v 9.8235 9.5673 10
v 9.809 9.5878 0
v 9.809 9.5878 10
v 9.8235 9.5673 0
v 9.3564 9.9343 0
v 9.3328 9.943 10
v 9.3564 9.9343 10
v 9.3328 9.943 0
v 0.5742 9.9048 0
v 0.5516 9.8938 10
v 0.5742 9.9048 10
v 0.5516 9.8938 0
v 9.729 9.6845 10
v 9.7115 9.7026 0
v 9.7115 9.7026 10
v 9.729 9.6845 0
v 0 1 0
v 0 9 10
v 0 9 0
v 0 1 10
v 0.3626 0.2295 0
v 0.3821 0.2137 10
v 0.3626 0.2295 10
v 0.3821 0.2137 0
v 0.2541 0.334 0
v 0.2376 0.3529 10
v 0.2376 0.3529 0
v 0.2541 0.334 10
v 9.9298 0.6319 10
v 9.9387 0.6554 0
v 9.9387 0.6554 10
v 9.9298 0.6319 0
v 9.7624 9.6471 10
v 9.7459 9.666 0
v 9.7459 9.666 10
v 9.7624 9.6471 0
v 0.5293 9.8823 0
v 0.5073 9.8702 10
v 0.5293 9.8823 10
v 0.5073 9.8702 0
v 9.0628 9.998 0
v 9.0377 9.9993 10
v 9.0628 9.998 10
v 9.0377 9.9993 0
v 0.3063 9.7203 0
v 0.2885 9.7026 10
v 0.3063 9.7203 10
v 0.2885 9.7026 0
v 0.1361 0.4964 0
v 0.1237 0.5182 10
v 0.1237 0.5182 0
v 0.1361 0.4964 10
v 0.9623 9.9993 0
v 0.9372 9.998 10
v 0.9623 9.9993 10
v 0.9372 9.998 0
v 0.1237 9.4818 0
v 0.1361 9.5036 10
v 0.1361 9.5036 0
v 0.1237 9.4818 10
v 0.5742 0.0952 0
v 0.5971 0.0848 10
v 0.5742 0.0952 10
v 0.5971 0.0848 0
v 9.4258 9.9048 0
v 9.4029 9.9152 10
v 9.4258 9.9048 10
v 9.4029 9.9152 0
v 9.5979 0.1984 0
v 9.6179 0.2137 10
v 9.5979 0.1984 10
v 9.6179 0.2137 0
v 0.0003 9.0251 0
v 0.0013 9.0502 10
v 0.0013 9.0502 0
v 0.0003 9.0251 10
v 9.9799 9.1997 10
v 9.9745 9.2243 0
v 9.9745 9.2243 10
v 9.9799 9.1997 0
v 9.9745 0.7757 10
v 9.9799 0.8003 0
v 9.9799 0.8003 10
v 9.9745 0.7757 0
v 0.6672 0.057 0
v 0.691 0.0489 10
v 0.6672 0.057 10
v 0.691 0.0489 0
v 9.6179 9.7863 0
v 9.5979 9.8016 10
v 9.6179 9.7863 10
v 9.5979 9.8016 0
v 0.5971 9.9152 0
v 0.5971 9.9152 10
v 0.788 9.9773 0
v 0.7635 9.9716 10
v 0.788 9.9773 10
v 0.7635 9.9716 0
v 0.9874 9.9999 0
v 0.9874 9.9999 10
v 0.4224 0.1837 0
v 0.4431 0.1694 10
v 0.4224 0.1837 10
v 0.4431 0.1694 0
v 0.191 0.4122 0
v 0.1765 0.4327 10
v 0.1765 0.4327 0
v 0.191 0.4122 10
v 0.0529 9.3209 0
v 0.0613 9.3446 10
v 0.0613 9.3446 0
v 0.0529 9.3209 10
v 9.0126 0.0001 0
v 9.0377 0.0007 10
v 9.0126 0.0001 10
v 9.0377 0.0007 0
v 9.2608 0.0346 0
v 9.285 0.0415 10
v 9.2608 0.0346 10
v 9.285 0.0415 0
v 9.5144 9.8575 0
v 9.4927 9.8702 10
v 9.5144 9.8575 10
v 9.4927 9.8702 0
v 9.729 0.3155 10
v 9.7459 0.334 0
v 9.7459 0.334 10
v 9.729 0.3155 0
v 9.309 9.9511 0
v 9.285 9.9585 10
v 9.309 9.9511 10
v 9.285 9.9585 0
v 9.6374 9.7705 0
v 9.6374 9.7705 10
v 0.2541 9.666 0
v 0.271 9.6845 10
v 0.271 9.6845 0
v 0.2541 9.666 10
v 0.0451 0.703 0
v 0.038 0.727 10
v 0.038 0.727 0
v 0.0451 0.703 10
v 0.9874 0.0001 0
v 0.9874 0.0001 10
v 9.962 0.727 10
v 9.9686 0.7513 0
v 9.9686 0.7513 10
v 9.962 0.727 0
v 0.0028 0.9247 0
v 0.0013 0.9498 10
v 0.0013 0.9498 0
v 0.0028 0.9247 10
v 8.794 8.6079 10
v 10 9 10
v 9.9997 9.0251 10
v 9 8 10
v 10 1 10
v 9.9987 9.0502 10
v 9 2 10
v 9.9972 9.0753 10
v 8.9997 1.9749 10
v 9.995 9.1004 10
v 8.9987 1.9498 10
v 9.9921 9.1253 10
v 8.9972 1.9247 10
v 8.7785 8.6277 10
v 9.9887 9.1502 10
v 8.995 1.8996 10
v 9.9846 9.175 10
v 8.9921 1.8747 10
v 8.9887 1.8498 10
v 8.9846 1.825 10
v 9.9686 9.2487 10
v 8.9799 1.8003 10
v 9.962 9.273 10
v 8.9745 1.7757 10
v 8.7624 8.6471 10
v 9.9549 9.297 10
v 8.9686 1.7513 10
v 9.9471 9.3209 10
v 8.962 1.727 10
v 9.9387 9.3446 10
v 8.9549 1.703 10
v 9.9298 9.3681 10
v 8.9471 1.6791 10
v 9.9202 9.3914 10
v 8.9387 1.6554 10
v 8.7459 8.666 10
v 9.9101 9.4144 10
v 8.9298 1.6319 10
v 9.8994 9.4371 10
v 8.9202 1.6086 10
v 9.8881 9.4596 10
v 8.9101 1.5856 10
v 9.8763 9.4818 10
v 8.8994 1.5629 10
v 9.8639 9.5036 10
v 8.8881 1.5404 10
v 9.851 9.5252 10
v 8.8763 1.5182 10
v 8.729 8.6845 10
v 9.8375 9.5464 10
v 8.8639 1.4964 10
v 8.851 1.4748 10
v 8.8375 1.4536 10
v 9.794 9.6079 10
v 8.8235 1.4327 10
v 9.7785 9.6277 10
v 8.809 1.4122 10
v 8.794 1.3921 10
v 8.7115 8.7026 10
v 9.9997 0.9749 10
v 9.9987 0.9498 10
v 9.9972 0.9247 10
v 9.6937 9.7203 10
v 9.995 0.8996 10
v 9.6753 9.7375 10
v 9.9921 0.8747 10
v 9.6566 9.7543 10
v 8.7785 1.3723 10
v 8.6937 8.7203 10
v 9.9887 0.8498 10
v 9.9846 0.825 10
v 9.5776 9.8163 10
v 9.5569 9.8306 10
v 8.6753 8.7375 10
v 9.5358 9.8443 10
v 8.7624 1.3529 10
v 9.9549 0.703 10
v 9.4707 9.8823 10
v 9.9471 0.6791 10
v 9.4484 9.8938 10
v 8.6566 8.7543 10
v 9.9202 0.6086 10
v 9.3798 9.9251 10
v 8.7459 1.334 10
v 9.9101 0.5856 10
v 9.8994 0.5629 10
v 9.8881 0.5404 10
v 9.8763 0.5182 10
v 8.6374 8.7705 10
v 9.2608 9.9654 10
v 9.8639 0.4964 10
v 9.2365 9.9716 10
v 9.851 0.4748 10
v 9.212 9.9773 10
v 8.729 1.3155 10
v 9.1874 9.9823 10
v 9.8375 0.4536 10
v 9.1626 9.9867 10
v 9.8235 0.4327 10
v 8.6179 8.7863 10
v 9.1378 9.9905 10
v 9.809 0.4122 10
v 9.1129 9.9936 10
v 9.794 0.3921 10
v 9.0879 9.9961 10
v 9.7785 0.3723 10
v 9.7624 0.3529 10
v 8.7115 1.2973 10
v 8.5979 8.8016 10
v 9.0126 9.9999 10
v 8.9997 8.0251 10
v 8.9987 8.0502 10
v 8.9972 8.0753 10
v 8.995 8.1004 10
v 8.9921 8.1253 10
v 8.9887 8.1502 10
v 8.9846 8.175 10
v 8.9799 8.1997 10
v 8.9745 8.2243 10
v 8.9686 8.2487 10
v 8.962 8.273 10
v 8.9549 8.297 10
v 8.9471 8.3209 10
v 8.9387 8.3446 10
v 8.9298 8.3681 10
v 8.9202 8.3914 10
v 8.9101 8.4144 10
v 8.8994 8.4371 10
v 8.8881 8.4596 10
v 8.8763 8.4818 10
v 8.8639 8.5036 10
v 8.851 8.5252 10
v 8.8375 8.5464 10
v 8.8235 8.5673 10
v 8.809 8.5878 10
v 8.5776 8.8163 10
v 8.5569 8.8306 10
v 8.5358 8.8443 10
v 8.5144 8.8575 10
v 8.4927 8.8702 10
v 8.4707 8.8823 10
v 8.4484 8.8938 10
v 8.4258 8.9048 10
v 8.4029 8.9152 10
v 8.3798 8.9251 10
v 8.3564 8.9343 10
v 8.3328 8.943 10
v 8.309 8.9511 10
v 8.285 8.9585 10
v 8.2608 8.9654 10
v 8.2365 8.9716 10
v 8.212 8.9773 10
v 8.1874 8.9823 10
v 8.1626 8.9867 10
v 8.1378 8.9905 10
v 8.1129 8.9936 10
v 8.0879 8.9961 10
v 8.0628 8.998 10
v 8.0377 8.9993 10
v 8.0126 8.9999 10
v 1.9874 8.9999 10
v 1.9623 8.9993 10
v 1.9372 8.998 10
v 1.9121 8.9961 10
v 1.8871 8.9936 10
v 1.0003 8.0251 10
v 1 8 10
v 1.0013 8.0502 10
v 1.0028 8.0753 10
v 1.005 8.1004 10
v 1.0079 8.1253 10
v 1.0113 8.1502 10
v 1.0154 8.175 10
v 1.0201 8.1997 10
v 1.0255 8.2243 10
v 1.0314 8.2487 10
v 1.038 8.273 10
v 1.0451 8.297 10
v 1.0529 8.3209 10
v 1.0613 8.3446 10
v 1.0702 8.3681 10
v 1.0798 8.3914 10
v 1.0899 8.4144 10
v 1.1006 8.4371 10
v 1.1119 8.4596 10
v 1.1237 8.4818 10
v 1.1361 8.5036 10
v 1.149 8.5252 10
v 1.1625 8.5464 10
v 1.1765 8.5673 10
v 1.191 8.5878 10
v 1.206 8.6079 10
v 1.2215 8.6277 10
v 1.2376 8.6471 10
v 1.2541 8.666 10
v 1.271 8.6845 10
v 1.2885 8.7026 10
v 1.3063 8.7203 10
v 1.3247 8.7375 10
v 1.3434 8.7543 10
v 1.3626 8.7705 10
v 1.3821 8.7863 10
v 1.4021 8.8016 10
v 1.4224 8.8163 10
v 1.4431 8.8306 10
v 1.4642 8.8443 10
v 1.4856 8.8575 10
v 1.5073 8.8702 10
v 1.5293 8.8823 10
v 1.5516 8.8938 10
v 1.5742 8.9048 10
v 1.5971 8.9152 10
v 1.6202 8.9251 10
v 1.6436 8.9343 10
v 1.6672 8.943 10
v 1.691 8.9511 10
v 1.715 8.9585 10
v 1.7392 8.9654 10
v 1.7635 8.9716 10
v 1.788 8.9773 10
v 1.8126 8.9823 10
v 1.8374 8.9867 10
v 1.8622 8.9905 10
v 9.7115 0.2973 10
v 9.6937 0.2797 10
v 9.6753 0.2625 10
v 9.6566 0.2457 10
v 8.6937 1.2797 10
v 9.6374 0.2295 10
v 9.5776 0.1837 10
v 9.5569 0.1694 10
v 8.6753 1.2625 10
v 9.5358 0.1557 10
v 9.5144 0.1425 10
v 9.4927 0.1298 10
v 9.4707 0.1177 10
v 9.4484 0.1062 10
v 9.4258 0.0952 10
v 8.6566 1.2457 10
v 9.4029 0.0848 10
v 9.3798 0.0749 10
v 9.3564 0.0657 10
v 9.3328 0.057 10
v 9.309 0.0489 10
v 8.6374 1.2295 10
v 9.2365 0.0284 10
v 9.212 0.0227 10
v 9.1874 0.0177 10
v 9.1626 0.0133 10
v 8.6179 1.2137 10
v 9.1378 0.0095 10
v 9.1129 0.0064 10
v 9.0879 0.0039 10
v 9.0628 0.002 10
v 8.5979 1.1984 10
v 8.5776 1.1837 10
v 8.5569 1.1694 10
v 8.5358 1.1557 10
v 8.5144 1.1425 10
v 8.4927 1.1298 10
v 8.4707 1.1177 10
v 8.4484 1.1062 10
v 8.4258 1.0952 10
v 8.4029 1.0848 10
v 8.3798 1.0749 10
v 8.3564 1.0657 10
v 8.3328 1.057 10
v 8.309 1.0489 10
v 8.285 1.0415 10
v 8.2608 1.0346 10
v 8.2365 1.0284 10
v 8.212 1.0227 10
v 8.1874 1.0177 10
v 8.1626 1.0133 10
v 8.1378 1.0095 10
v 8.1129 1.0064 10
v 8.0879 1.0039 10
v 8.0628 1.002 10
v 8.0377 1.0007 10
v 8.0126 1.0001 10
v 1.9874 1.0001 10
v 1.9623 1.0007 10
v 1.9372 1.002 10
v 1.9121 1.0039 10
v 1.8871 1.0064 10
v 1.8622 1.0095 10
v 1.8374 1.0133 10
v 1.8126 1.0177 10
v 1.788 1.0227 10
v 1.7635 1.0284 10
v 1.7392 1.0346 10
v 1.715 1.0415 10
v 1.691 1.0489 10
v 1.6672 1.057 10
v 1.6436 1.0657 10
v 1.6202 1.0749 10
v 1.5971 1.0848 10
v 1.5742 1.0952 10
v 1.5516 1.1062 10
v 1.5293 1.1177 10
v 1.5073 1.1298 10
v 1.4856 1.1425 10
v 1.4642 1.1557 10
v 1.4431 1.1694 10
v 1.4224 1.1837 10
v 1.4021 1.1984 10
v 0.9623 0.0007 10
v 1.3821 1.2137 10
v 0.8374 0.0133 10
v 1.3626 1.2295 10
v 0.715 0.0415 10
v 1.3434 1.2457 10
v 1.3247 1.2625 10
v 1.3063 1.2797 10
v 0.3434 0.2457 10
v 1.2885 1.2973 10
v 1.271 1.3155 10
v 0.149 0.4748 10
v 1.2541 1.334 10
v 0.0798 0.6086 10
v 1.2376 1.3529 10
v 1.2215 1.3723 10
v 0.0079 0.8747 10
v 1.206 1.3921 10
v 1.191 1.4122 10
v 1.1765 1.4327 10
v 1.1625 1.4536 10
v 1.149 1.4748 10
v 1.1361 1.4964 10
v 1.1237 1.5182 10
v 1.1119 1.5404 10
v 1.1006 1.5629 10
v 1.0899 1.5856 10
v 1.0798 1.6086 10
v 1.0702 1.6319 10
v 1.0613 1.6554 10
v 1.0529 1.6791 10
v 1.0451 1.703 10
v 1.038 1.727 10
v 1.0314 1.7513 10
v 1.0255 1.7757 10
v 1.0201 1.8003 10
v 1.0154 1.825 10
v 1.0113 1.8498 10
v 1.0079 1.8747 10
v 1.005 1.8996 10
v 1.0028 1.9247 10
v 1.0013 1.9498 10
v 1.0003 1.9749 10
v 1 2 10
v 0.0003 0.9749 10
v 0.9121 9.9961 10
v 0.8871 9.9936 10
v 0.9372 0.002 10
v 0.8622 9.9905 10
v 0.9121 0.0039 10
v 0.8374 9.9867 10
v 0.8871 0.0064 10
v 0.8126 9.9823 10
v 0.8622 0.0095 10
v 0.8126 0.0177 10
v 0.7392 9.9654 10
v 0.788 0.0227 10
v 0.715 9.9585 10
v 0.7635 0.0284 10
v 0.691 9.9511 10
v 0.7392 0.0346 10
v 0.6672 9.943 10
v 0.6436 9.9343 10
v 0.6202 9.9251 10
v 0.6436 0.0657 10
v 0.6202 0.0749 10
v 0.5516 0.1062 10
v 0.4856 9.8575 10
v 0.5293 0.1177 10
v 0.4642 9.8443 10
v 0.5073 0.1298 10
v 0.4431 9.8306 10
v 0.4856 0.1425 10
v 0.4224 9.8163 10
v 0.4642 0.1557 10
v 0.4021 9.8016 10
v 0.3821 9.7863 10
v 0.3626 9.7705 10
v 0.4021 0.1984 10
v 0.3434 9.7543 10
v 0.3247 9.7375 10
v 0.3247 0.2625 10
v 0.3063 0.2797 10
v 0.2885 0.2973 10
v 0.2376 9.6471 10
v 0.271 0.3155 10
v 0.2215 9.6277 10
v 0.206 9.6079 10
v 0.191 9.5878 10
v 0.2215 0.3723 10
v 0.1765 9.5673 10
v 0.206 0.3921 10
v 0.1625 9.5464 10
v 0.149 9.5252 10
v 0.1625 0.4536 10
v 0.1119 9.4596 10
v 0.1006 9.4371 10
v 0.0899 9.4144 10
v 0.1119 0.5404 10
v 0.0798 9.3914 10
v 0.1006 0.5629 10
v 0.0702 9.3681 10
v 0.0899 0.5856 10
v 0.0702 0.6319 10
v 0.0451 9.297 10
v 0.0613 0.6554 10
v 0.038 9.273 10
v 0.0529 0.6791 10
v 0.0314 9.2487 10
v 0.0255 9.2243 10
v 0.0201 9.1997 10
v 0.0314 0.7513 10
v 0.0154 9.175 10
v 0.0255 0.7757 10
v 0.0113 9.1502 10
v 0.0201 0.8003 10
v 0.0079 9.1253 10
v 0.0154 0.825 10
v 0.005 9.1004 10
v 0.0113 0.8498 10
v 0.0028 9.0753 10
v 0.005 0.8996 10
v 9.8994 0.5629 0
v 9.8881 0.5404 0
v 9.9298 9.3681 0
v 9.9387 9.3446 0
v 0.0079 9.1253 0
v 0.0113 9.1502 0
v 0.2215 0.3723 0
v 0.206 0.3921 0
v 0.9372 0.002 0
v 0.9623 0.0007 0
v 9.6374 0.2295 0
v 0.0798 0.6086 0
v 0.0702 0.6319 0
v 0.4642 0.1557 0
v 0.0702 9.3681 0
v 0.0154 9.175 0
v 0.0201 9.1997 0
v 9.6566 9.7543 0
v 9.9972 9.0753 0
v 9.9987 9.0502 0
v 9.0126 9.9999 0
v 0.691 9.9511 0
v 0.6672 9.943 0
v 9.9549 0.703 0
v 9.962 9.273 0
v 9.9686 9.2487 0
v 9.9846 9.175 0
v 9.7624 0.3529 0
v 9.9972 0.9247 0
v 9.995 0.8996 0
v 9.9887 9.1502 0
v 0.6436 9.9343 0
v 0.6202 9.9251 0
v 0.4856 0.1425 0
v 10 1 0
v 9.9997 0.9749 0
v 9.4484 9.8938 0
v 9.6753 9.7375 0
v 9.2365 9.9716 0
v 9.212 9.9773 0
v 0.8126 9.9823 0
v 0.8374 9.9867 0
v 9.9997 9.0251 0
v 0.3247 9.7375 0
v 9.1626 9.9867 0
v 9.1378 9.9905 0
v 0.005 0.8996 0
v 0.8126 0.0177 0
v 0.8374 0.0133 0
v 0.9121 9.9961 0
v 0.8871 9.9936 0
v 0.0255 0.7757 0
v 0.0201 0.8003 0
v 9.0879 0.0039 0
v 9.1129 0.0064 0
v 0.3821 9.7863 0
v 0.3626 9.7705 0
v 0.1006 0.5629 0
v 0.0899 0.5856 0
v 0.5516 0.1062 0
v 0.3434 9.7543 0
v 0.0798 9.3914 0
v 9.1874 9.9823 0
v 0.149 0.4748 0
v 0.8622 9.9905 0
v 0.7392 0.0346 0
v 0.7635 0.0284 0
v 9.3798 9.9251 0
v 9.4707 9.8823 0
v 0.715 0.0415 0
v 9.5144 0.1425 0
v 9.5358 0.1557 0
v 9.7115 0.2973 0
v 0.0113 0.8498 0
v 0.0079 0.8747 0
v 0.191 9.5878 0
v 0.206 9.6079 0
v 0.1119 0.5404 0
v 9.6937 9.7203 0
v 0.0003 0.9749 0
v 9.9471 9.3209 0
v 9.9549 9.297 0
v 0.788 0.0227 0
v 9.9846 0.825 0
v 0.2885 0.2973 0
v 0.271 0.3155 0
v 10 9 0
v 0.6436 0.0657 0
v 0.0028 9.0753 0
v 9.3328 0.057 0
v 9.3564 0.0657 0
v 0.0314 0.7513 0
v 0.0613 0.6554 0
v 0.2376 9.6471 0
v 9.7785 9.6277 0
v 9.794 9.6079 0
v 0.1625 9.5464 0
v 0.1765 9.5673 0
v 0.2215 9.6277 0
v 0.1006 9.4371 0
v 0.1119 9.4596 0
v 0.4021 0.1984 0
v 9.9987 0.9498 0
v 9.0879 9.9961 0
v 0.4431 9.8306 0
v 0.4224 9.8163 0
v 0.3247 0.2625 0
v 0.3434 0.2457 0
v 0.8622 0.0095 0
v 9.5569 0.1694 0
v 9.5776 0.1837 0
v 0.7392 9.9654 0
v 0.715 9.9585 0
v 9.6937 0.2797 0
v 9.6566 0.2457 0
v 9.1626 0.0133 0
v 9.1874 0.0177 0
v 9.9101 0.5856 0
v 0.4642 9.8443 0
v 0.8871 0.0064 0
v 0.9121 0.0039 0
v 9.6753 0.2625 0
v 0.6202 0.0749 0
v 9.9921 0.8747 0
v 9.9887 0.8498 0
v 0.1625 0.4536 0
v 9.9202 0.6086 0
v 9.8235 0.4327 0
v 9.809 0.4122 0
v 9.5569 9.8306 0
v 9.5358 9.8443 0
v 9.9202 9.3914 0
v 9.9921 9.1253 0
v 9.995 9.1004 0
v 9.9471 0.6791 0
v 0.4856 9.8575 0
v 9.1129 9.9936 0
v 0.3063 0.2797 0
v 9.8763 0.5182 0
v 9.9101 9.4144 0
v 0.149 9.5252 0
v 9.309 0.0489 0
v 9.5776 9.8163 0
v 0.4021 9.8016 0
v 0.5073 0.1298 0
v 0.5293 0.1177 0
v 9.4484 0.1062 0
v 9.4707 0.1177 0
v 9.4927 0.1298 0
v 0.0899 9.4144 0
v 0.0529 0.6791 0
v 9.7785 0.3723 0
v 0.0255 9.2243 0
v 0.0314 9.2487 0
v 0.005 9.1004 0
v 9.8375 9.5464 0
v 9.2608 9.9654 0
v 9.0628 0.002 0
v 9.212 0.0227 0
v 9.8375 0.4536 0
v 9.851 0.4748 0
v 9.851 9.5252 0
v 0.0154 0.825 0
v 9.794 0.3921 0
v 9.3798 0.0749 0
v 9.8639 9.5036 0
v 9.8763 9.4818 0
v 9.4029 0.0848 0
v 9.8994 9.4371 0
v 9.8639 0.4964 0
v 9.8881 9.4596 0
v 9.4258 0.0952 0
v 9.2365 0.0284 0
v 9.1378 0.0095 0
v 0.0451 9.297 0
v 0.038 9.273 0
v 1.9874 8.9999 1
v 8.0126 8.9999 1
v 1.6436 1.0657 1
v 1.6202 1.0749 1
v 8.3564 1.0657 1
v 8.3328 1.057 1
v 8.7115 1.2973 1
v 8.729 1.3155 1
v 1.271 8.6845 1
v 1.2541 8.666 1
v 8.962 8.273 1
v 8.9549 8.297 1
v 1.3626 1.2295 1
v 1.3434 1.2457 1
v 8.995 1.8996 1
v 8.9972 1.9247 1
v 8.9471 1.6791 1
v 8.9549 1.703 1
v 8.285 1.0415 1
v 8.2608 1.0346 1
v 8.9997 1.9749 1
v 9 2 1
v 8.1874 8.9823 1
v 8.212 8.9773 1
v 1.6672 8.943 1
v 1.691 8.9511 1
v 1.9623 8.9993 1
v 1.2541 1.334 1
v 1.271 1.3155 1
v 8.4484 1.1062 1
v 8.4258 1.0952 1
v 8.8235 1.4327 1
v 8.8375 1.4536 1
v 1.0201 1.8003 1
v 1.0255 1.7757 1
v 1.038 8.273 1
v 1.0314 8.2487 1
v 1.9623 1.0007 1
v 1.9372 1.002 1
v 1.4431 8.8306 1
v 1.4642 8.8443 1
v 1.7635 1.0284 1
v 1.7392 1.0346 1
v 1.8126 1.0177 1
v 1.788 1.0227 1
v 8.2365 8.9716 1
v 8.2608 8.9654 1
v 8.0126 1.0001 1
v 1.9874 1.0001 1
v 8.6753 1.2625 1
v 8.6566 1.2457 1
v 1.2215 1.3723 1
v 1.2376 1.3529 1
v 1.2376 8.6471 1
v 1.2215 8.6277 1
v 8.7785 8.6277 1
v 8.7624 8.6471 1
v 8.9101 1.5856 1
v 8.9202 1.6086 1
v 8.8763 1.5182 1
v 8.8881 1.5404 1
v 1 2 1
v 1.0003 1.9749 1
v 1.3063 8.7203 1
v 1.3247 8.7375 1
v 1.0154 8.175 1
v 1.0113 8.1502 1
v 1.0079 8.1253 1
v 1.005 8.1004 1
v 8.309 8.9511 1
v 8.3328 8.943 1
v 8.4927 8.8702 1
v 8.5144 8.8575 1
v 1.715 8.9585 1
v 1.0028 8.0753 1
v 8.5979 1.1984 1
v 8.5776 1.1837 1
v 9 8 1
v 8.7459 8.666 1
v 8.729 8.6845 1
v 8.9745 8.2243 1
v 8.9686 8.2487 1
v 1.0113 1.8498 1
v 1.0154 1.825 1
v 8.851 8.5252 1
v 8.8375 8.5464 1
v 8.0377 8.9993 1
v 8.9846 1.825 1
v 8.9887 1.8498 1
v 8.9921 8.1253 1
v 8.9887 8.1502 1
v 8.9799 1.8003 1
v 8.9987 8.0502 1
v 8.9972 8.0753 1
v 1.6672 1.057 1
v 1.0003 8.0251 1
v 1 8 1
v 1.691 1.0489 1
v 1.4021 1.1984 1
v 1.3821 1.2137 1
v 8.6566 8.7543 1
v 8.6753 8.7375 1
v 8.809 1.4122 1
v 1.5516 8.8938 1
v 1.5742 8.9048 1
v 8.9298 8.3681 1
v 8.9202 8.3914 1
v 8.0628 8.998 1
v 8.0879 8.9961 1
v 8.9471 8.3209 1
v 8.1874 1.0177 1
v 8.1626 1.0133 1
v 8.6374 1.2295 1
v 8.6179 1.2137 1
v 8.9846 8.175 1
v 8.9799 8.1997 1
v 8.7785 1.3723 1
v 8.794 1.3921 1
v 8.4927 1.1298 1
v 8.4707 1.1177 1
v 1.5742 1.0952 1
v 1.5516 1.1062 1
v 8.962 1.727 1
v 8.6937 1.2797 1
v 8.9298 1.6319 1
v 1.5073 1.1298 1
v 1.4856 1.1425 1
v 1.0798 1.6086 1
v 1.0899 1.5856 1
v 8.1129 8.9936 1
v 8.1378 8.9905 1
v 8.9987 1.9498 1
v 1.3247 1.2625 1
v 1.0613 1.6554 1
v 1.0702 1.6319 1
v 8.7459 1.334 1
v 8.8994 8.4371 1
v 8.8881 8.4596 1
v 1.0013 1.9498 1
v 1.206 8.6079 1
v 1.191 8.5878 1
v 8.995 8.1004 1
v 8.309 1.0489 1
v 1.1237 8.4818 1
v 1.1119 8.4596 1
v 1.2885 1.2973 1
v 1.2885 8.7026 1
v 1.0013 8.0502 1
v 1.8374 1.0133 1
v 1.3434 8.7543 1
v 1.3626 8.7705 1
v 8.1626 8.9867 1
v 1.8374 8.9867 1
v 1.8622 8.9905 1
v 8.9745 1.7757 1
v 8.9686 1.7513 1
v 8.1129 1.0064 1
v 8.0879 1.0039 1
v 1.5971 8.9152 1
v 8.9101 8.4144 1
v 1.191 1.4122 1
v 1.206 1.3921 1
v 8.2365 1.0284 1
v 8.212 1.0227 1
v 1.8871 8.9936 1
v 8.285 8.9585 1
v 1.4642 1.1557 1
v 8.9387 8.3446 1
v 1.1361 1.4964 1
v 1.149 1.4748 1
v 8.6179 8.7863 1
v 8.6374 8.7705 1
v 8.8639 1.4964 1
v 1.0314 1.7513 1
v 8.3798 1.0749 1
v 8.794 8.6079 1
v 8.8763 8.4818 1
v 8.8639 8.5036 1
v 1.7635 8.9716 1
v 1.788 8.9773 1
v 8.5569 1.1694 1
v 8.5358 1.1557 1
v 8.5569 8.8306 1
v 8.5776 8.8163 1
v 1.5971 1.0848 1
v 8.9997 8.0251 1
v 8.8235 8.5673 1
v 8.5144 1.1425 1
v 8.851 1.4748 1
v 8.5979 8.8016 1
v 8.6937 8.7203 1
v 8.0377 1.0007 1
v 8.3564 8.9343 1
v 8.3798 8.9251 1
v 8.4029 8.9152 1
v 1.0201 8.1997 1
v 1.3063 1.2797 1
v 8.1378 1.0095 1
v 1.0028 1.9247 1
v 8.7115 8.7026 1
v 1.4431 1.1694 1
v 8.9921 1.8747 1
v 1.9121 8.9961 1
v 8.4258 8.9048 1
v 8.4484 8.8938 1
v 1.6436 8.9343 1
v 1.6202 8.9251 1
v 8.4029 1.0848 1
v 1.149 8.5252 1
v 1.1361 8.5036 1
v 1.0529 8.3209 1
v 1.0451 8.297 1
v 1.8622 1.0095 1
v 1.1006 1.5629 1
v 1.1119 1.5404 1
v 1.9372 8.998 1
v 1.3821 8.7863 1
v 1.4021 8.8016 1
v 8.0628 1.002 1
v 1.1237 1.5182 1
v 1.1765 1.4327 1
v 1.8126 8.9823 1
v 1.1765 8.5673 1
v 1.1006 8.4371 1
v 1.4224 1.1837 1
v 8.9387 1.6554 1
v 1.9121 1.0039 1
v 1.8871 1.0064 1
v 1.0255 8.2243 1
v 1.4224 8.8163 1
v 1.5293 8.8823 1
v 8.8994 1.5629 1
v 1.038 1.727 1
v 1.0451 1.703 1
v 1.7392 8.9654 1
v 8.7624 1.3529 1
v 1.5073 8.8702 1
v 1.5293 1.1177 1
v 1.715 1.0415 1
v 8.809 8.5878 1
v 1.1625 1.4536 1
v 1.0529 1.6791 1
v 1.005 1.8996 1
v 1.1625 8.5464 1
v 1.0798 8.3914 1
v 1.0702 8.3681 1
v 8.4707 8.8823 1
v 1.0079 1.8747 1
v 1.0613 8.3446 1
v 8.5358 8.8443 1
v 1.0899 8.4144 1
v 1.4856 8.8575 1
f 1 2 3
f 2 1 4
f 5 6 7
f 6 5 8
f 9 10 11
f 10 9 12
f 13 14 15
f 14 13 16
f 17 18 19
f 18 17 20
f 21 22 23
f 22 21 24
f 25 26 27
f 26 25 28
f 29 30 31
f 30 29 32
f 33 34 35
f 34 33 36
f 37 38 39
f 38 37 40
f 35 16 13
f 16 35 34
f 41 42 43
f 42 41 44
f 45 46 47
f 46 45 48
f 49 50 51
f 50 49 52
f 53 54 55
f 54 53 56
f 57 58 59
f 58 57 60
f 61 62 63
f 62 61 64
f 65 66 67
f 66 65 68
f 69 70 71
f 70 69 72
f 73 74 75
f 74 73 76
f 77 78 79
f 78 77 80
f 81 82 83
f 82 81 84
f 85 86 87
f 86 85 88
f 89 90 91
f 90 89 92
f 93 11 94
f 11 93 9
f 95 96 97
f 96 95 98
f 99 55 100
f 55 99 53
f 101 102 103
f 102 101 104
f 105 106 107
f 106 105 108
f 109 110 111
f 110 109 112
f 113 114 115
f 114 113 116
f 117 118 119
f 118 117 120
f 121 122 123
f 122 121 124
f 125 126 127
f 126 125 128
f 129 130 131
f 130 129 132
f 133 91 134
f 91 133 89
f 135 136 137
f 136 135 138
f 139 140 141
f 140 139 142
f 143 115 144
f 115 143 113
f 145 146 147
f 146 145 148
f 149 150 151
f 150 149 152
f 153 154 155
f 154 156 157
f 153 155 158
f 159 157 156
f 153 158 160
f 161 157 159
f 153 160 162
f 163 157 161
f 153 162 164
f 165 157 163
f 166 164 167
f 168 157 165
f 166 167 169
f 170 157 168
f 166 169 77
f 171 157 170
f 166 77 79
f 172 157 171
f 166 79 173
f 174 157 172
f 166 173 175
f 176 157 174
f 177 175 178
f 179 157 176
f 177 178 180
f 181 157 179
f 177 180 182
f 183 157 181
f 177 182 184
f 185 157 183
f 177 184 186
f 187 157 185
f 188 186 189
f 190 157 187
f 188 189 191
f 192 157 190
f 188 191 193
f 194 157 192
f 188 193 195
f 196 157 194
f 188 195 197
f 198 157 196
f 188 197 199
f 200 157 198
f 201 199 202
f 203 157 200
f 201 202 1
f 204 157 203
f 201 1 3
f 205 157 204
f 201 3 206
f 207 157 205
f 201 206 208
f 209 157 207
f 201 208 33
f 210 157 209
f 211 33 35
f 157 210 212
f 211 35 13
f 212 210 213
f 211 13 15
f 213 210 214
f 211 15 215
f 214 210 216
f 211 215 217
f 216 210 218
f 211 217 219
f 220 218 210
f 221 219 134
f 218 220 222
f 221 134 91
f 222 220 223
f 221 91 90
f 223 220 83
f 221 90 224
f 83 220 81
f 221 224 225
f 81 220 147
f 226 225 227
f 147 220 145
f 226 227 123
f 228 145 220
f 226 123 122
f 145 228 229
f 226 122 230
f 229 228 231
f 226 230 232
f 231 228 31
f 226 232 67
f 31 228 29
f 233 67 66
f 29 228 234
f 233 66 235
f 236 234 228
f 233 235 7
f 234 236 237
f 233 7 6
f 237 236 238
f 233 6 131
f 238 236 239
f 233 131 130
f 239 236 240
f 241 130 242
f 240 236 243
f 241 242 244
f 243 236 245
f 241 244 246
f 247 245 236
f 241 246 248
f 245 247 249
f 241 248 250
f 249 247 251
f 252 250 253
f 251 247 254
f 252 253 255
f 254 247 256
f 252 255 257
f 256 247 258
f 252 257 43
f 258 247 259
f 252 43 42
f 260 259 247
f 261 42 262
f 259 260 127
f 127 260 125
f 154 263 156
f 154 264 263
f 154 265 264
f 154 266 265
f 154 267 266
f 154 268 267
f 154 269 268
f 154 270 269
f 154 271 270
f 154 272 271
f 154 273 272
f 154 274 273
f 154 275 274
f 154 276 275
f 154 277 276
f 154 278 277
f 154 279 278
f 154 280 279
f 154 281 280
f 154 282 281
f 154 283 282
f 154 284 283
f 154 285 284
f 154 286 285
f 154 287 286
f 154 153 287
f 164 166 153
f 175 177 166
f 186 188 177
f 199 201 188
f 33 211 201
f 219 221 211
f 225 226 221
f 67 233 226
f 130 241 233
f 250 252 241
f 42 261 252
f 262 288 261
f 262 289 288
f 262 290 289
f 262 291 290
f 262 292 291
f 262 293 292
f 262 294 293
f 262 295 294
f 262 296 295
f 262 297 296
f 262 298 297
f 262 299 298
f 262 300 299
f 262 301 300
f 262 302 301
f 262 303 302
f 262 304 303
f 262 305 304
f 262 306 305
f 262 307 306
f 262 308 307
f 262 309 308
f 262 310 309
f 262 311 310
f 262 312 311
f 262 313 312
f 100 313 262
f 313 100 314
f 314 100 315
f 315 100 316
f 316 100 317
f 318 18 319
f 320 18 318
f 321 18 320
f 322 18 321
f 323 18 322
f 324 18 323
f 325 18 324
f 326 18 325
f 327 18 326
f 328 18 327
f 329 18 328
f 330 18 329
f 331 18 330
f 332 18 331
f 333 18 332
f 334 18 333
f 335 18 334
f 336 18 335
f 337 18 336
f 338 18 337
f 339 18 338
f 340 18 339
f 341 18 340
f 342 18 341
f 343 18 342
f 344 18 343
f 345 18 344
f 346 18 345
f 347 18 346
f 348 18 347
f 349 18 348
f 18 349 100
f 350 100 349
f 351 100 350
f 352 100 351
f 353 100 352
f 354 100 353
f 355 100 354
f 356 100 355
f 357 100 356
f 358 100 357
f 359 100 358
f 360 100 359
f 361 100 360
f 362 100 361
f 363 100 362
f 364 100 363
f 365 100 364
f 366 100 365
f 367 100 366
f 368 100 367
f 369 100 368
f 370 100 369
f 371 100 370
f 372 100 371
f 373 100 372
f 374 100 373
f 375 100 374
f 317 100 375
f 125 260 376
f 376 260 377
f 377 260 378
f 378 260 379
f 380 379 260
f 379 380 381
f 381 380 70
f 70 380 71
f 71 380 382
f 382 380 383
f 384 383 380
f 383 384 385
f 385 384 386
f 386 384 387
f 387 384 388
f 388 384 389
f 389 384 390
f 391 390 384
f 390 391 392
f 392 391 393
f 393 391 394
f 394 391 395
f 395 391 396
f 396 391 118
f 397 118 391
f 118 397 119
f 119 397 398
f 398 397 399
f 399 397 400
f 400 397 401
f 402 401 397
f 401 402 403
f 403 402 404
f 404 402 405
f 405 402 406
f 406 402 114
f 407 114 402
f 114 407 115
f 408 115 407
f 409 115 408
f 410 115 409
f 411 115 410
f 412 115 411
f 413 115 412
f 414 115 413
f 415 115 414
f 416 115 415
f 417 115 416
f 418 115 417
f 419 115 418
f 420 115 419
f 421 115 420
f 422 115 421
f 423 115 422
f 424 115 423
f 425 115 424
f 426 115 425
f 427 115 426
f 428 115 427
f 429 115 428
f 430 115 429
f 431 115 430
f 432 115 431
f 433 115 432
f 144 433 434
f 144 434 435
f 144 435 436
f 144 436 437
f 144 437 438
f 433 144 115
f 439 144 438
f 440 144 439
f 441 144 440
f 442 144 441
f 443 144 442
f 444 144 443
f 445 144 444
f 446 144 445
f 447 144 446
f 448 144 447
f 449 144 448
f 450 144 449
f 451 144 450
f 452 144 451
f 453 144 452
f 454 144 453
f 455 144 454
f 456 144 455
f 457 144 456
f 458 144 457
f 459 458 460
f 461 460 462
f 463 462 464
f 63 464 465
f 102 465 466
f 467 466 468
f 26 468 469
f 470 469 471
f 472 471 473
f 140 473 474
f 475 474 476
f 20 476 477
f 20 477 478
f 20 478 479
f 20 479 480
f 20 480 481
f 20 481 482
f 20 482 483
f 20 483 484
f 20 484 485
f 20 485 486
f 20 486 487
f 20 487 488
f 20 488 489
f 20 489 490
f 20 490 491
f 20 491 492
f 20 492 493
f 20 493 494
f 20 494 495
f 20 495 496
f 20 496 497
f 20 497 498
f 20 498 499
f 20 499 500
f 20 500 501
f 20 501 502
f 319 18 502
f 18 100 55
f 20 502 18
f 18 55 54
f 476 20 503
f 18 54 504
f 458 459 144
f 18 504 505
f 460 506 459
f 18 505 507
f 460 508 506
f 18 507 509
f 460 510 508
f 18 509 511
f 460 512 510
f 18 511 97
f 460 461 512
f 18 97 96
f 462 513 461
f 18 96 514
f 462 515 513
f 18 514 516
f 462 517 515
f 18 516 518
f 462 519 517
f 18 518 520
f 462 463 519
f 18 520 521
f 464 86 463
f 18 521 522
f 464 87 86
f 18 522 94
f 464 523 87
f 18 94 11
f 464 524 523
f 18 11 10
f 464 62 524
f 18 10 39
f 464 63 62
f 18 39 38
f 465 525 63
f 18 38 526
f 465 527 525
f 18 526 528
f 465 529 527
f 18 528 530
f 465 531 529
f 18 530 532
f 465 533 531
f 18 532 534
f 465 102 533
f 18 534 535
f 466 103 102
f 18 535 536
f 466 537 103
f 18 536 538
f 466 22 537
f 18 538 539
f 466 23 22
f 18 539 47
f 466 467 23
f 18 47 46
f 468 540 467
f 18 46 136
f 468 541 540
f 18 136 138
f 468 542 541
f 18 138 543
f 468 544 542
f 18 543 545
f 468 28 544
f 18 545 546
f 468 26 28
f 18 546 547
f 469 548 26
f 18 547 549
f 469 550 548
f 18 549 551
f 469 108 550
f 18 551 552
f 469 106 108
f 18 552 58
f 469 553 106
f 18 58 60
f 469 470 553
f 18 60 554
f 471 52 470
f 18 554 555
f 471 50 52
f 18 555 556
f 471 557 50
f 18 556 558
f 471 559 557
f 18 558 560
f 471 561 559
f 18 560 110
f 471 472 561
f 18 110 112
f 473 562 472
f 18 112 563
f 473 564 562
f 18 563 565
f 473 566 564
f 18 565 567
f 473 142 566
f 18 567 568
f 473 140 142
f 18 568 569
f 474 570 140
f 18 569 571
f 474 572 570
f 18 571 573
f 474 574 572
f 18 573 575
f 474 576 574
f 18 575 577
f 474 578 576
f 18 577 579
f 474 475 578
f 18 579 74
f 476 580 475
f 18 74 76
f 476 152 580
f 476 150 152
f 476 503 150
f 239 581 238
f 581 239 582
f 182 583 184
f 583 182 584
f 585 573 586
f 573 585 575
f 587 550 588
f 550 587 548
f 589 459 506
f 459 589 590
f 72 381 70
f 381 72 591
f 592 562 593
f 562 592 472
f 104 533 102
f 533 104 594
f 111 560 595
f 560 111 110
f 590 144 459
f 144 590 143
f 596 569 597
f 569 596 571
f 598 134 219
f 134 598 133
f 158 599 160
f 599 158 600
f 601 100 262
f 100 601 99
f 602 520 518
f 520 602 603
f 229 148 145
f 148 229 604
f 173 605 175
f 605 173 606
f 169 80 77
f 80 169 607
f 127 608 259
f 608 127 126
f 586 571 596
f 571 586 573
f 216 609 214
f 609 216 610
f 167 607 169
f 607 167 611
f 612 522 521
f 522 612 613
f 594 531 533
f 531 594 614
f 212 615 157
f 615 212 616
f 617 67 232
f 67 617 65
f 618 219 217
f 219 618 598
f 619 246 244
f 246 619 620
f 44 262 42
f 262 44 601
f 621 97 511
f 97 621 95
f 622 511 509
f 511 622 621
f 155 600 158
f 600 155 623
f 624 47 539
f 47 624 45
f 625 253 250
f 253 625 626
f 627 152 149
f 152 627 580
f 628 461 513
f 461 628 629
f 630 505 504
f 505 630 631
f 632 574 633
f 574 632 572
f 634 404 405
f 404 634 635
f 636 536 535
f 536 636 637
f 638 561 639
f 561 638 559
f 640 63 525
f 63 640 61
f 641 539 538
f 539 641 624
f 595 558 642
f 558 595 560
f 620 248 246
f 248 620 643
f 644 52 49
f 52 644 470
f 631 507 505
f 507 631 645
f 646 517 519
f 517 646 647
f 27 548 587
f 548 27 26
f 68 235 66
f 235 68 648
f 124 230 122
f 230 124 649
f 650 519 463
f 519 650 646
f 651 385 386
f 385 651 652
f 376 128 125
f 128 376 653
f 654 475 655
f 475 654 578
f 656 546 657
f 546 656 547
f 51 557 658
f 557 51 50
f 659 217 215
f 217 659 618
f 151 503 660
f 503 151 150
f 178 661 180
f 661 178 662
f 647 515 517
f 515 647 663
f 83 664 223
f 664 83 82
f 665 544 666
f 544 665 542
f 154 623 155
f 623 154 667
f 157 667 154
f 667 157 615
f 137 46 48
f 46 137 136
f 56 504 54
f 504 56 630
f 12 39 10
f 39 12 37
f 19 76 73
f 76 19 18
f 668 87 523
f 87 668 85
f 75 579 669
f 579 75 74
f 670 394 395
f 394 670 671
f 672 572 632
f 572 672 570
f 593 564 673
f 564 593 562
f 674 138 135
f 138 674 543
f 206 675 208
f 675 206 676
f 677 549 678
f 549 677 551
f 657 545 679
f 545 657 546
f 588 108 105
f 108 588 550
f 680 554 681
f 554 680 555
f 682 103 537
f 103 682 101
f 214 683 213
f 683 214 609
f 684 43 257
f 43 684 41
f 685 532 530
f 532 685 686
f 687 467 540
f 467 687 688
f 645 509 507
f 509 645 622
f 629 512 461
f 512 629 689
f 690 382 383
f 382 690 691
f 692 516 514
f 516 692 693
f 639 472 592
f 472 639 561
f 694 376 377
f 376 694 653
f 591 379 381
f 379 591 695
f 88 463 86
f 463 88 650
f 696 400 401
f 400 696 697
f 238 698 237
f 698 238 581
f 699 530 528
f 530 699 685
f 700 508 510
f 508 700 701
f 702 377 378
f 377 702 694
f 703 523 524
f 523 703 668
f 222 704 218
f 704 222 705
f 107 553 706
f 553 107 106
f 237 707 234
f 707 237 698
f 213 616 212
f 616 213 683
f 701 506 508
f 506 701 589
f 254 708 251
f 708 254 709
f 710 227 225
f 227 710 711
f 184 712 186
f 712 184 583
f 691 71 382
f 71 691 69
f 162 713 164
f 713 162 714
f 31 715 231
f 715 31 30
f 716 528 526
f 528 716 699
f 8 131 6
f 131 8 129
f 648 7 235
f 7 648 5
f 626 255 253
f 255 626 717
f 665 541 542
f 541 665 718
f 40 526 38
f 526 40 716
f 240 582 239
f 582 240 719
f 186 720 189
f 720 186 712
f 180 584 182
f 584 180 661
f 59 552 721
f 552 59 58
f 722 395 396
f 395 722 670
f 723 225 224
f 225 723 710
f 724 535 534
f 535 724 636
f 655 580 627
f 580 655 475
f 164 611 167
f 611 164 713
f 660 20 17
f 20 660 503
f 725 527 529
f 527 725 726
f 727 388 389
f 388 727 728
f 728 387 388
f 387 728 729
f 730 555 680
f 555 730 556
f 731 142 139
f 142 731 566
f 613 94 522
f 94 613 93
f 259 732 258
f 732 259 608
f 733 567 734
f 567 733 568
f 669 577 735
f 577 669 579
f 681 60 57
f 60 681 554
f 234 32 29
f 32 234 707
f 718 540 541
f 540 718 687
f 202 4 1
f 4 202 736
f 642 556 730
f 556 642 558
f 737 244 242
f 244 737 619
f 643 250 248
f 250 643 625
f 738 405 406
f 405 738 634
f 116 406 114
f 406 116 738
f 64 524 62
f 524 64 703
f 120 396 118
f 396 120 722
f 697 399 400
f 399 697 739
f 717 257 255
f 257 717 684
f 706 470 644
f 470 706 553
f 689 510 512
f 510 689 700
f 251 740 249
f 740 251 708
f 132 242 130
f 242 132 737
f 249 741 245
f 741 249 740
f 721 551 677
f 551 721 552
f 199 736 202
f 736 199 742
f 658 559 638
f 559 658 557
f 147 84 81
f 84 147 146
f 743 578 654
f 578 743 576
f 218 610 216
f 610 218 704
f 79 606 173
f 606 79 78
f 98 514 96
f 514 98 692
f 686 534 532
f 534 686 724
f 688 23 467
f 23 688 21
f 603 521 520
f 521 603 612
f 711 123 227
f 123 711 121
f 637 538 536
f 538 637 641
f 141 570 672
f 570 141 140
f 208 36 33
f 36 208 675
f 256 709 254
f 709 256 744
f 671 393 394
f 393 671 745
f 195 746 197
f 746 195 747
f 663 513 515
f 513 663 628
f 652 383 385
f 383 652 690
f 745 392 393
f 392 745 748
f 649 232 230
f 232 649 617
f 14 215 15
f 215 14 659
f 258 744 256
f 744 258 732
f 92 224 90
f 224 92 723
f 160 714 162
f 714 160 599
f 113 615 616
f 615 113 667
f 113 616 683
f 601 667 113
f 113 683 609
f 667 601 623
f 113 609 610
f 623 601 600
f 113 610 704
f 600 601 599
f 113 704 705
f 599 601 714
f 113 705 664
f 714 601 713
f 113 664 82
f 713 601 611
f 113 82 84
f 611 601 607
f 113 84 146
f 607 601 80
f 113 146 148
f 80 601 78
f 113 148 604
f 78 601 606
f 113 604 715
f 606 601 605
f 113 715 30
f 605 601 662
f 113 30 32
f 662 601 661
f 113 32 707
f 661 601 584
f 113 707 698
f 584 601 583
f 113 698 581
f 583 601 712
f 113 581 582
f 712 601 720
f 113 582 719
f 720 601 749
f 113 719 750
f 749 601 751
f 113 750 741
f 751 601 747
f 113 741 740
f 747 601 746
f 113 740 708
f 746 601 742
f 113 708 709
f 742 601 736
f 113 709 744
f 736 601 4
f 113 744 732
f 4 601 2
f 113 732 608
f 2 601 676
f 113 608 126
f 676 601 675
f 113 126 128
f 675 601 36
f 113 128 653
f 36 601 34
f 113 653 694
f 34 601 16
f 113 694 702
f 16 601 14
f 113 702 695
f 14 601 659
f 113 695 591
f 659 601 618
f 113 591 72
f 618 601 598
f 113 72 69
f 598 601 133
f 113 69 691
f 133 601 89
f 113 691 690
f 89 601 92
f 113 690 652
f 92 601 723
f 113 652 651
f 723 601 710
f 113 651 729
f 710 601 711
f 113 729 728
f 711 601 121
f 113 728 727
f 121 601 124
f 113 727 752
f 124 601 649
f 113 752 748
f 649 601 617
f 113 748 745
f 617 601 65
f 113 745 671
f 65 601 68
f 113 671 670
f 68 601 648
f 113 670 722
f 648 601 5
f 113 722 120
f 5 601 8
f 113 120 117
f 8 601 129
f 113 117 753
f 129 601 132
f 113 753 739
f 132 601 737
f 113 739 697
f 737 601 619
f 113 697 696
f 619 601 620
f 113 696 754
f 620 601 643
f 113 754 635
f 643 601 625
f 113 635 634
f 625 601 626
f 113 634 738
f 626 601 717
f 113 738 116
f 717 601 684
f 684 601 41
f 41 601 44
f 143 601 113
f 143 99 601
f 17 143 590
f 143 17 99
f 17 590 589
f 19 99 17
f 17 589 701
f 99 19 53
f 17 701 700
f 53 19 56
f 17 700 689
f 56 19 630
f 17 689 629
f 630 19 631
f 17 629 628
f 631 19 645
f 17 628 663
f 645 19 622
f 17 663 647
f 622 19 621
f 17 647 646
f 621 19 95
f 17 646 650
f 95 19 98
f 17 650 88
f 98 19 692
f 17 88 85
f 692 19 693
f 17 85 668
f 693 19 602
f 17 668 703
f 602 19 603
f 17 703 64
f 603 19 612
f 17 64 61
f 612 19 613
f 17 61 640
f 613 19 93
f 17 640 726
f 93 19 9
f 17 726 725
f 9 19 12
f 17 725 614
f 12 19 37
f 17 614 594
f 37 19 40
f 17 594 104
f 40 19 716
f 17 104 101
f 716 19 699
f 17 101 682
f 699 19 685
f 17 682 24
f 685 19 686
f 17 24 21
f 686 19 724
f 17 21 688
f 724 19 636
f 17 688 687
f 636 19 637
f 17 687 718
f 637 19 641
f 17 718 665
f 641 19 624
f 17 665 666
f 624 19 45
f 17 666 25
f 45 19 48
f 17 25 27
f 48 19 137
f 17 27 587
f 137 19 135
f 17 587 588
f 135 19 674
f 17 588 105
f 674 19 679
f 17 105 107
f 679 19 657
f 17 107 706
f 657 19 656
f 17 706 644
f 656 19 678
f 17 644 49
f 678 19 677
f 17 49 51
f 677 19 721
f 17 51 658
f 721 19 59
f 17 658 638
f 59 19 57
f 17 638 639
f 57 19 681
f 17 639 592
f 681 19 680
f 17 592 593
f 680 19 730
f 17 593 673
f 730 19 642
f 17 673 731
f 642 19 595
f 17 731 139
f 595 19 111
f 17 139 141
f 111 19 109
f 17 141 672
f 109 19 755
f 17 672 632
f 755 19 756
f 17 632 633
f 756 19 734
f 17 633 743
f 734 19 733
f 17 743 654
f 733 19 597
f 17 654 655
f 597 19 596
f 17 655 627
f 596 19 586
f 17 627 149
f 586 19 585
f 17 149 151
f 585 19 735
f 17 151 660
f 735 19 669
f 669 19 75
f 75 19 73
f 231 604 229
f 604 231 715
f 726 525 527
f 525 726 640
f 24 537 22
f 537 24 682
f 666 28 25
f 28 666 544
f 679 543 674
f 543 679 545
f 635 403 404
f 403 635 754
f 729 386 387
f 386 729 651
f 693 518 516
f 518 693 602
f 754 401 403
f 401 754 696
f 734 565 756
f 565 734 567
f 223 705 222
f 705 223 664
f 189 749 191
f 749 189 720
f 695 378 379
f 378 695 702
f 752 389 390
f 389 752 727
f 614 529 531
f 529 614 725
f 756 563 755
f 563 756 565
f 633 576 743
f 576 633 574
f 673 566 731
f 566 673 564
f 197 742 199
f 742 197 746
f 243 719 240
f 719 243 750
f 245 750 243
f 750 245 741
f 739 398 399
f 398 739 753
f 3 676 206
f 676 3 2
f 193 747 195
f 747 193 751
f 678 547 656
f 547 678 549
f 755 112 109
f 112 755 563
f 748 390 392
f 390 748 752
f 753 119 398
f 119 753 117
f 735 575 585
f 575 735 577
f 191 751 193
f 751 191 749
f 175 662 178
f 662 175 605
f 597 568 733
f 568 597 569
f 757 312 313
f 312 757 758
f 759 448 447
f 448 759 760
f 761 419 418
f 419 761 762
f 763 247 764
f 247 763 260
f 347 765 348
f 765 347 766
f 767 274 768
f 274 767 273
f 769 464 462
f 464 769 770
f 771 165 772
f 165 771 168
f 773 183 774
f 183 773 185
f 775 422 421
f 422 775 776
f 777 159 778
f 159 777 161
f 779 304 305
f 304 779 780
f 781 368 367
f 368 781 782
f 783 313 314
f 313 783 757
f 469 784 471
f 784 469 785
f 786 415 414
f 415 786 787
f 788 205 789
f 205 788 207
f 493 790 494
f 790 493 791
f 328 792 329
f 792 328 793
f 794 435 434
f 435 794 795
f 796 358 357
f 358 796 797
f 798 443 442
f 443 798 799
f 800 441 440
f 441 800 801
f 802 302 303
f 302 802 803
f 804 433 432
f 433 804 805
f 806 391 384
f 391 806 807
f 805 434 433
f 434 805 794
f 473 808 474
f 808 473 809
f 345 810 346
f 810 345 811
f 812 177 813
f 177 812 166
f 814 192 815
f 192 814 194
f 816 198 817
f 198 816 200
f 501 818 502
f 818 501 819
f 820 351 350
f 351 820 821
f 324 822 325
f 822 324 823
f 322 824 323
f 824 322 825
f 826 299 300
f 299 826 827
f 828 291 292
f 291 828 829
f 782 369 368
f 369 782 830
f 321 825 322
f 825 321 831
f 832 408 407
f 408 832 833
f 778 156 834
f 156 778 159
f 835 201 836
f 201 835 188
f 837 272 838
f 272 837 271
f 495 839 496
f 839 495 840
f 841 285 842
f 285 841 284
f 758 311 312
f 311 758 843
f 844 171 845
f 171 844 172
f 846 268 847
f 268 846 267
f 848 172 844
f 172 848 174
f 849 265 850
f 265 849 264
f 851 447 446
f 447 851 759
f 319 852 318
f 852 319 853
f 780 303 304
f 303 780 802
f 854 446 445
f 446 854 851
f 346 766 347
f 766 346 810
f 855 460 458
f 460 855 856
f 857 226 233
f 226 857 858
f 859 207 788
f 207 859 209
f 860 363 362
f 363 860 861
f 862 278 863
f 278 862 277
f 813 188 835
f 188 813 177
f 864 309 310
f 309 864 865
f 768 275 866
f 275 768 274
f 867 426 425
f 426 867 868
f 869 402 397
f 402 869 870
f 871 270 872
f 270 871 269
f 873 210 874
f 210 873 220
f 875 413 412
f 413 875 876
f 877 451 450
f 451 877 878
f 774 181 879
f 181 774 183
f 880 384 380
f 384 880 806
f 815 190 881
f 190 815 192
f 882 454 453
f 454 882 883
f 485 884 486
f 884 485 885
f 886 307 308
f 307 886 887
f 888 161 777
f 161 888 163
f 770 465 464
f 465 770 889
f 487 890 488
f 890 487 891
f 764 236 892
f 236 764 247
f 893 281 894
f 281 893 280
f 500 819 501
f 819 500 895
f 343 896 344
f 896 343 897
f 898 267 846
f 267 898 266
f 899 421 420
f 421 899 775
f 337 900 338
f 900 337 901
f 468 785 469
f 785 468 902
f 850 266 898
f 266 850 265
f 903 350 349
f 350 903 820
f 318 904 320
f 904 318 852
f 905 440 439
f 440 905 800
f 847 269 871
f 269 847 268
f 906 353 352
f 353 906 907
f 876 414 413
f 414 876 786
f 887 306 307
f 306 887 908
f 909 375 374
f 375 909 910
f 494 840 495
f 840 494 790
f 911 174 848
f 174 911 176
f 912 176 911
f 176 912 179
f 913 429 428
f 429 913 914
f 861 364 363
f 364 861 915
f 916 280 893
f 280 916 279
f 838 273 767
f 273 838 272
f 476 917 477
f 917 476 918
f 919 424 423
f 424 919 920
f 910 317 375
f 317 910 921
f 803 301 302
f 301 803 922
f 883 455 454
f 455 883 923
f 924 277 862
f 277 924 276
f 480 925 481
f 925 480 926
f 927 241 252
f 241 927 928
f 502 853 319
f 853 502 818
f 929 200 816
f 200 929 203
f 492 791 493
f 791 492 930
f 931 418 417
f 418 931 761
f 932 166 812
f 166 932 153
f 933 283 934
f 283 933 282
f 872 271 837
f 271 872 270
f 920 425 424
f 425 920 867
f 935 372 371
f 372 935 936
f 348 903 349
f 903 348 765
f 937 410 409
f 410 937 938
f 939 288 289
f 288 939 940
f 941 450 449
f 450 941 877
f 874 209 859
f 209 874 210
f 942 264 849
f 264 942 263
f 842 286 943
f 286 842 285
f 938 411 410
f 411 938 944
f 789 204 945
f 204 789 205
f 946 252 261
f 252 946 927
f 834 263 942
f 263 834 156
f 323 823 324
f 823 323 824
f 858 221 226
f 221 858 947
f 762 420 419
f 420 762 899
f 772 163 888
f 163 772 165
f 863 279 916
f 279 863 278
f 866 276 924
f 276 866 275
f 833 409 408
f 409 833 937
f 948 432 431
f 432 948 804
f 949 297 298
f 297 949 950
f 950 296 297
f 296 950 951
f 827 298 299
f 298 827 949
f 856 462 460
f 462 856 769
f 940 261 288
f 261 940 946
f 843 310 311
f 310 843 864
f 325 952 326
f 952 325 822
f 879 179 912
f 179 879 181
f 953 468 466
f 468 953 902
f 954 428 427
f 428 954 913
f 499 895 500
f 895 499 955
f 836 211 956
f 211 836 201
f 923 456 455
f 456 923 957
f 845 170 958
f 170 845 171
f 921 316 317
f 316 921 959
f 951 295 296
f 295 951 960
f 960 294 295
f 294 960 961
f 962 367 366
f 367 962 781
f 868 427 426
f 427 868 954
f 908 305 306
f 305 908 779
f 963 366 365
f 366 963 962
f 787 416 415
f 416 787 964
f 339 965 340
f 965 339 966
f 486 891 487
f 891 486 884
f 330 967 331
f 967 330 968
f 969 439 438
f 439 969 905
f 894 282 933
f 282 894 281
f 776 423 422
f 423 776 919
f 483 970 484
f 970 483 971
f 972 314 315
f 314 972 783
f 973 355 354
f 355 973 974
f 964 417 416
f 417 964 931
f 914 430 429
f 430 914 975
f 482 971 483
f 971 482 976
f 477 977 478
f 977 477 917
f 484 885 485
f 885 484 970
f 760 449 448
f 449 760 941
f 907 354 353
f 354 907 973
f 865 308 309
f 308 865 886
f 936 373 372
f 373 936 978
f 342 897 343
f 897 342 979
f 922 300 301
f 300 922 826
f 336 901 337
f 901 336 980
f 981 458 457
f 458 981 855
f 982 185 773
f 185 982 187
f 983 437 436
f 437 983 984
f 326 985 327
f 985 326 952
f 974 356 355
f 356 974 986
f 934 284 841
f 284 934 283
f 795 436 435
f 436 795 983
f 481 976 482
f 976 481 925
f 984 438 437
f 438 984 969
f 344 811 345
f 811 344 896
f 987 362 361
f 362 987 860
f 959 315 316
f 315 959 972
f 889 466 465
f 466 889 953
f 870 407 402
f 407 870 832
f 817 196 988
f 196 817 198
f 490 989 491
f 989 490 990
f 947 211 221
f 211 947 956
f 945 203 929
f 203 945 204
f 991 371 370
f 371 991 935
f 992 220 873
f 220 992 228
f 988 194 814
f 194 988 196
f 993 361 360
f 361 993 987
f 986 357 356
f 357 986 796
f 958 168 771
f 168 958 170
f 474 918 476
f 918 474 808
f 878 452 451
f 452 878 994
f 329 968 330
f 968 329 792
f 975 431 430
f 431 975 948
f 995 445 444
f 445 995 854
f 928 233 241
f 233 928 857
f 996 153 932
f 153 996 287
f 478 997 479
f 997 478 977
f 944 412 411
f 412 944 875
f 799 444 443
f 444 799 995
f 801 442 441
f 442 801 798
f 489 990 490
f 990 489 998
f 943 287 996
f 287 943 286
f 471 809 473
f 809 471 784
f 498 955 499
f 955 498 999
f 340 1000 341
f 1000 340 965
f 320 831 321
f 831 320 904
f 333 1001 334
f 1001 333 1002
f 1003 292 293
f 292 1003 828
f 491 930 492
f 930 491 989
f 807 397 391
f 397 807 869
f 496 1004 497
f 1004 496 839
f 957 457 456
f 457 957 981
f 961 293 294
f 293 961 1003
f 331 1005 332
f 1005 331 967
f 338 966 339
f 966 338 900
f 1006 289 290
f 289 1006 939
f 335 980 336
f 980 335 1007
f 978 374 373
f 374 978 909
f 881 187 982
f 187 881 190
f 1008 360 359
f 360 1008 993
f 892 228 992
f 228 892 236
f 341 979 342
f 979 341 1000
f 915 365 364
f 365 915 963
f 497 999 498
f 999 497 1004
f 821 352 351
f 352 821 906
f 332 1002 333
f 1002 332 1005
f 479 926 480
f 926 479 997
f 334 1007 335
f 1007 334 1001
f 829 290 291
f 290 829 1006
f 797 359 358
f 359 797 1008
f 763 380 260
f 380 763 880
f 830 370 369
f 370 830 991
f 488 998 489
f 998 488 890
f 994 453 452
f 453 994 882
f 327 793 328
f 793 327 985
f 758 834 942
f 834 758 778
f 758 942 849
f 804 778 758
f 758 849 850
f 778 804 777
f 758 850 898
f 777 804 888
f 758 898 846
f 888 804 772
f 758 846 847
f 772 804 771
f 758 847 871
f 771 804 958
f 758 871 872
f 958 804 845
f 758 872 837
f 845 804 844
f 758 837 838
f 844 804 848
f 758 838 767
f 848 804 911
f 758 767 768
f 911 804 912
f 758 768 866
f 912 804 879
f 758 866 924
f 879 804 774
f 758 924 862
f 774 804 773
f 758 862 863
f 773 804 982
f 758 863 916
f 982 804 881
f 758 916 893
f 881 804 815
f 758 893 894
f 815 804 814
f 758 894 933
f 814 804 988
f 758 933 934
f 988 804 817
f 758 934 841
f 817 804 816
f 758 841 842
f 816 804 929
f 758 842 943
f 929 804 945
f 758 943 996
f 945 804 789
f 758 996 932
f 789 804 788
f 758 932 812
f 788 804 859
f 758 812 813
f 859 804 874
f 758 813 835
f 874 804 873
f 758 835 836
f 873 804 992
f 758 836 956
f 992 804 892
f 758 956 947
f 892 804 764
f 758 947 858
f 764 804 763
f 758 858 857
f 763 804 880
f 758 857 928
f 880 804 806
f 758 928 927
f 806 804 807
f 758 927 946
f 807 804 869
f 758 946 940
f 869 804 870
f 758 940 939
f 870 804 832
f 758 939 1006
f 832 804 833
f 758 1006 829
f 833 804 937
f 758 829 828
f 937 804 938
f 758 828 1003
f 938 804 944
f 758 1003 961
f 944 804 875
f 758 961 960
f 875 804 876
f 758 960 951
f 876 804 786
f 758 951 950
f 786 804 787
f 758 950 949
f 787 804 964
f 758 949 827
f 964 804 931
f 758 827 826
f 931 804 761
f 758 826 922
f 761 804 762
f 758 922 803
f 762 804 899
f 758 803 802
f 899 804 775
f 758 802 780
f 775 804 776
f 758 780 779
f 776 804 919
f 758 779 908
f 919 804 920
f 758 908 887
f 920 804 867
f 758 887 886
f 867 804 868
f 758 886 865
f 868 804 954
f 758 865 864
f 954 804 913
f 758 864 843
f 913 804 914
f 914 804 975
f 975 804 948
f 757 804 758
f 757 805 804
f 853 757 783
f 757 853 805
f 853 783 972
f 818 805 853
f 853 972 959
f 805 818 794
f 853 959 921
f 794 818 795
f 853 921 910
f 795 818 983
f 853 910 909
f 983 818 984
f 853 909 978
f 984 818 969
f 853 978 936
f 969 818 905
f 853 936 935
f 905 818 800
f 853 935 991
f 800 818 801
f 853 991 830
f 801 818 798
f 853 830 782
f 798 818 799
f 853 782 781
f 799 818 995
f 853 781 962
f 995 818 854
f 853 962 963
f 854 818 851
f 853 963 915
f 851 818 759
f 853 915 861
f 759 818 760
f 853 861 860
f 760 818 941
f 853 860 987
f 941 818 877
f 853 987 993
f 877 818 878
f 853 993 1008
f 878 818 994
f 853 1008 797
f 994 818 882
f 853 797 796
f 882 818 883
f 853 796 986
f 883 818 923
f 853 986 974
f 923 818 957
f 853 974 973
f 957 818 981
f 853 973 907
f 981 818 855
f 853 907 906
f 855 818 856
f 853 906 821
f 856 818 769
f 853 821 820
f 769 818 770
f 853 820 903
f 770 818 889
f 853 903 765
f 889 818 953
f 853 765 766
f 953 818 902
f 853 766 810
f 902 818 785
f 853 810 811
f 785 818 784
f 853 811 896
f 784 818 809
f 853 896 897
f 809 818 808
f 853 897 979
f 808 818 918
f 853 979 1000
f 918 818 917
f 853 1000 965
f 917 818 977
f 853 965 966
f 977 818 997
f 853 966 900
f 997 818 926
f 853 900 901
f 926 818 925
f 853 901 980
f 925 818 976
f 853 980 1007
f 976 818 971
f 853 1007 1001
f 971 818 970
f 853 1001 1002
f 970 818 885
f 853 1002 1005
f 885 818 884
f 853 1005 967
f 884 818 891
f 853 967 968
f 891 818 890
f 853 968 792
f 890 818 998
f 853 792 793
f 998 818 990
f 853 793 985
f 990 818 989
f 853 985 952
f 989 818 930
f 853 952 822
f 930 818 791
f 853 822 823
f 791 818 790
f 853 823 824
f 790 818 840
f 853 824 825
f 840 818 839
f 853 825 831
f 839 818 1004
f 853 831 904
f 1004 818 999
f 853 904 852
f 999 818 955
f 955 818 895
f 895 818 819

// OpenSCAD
//basic af box
// preview[view:south, tilt:top]

//CUSTOMIZER VARIABLES
$fn = $fn + 250;

//Length
x = 10; // [1:150]
//Width
y = 10; // [1:150]
//Height
z = 10; // [1:150]

wall_thickness = 1; // [1:150]
base_thickness = 1; // [1:150]
chamfer_edge = 1; // [1:150]

//CUSTOMIZER VARIABLES END

difference(){
    roundedcube(x,y,z,chamfer_edge);
    translate([wall_thickness,wall_thickness,base_thickness])
    roundedcube(x-(wall_thickness*2),y-(wall_thickness*2),z,chamfer_edge);
}

module roundedcube(xdim ,ydim ,zdim,rdim){
hull(){
    translate([rdim,rdim,0])cylinder(h=zdim,r=rdim);
    translate([xdim-rdim,rdim,0])cylinder(h=zdim,r=rdim);
    translate([rdim,ydim-rdim,0])cylinder(h=zdim,r=rdim);
    translate([xdim-rdim,ydim-rdim,0])cylinder(h=zdim,r=rdim);
}}
